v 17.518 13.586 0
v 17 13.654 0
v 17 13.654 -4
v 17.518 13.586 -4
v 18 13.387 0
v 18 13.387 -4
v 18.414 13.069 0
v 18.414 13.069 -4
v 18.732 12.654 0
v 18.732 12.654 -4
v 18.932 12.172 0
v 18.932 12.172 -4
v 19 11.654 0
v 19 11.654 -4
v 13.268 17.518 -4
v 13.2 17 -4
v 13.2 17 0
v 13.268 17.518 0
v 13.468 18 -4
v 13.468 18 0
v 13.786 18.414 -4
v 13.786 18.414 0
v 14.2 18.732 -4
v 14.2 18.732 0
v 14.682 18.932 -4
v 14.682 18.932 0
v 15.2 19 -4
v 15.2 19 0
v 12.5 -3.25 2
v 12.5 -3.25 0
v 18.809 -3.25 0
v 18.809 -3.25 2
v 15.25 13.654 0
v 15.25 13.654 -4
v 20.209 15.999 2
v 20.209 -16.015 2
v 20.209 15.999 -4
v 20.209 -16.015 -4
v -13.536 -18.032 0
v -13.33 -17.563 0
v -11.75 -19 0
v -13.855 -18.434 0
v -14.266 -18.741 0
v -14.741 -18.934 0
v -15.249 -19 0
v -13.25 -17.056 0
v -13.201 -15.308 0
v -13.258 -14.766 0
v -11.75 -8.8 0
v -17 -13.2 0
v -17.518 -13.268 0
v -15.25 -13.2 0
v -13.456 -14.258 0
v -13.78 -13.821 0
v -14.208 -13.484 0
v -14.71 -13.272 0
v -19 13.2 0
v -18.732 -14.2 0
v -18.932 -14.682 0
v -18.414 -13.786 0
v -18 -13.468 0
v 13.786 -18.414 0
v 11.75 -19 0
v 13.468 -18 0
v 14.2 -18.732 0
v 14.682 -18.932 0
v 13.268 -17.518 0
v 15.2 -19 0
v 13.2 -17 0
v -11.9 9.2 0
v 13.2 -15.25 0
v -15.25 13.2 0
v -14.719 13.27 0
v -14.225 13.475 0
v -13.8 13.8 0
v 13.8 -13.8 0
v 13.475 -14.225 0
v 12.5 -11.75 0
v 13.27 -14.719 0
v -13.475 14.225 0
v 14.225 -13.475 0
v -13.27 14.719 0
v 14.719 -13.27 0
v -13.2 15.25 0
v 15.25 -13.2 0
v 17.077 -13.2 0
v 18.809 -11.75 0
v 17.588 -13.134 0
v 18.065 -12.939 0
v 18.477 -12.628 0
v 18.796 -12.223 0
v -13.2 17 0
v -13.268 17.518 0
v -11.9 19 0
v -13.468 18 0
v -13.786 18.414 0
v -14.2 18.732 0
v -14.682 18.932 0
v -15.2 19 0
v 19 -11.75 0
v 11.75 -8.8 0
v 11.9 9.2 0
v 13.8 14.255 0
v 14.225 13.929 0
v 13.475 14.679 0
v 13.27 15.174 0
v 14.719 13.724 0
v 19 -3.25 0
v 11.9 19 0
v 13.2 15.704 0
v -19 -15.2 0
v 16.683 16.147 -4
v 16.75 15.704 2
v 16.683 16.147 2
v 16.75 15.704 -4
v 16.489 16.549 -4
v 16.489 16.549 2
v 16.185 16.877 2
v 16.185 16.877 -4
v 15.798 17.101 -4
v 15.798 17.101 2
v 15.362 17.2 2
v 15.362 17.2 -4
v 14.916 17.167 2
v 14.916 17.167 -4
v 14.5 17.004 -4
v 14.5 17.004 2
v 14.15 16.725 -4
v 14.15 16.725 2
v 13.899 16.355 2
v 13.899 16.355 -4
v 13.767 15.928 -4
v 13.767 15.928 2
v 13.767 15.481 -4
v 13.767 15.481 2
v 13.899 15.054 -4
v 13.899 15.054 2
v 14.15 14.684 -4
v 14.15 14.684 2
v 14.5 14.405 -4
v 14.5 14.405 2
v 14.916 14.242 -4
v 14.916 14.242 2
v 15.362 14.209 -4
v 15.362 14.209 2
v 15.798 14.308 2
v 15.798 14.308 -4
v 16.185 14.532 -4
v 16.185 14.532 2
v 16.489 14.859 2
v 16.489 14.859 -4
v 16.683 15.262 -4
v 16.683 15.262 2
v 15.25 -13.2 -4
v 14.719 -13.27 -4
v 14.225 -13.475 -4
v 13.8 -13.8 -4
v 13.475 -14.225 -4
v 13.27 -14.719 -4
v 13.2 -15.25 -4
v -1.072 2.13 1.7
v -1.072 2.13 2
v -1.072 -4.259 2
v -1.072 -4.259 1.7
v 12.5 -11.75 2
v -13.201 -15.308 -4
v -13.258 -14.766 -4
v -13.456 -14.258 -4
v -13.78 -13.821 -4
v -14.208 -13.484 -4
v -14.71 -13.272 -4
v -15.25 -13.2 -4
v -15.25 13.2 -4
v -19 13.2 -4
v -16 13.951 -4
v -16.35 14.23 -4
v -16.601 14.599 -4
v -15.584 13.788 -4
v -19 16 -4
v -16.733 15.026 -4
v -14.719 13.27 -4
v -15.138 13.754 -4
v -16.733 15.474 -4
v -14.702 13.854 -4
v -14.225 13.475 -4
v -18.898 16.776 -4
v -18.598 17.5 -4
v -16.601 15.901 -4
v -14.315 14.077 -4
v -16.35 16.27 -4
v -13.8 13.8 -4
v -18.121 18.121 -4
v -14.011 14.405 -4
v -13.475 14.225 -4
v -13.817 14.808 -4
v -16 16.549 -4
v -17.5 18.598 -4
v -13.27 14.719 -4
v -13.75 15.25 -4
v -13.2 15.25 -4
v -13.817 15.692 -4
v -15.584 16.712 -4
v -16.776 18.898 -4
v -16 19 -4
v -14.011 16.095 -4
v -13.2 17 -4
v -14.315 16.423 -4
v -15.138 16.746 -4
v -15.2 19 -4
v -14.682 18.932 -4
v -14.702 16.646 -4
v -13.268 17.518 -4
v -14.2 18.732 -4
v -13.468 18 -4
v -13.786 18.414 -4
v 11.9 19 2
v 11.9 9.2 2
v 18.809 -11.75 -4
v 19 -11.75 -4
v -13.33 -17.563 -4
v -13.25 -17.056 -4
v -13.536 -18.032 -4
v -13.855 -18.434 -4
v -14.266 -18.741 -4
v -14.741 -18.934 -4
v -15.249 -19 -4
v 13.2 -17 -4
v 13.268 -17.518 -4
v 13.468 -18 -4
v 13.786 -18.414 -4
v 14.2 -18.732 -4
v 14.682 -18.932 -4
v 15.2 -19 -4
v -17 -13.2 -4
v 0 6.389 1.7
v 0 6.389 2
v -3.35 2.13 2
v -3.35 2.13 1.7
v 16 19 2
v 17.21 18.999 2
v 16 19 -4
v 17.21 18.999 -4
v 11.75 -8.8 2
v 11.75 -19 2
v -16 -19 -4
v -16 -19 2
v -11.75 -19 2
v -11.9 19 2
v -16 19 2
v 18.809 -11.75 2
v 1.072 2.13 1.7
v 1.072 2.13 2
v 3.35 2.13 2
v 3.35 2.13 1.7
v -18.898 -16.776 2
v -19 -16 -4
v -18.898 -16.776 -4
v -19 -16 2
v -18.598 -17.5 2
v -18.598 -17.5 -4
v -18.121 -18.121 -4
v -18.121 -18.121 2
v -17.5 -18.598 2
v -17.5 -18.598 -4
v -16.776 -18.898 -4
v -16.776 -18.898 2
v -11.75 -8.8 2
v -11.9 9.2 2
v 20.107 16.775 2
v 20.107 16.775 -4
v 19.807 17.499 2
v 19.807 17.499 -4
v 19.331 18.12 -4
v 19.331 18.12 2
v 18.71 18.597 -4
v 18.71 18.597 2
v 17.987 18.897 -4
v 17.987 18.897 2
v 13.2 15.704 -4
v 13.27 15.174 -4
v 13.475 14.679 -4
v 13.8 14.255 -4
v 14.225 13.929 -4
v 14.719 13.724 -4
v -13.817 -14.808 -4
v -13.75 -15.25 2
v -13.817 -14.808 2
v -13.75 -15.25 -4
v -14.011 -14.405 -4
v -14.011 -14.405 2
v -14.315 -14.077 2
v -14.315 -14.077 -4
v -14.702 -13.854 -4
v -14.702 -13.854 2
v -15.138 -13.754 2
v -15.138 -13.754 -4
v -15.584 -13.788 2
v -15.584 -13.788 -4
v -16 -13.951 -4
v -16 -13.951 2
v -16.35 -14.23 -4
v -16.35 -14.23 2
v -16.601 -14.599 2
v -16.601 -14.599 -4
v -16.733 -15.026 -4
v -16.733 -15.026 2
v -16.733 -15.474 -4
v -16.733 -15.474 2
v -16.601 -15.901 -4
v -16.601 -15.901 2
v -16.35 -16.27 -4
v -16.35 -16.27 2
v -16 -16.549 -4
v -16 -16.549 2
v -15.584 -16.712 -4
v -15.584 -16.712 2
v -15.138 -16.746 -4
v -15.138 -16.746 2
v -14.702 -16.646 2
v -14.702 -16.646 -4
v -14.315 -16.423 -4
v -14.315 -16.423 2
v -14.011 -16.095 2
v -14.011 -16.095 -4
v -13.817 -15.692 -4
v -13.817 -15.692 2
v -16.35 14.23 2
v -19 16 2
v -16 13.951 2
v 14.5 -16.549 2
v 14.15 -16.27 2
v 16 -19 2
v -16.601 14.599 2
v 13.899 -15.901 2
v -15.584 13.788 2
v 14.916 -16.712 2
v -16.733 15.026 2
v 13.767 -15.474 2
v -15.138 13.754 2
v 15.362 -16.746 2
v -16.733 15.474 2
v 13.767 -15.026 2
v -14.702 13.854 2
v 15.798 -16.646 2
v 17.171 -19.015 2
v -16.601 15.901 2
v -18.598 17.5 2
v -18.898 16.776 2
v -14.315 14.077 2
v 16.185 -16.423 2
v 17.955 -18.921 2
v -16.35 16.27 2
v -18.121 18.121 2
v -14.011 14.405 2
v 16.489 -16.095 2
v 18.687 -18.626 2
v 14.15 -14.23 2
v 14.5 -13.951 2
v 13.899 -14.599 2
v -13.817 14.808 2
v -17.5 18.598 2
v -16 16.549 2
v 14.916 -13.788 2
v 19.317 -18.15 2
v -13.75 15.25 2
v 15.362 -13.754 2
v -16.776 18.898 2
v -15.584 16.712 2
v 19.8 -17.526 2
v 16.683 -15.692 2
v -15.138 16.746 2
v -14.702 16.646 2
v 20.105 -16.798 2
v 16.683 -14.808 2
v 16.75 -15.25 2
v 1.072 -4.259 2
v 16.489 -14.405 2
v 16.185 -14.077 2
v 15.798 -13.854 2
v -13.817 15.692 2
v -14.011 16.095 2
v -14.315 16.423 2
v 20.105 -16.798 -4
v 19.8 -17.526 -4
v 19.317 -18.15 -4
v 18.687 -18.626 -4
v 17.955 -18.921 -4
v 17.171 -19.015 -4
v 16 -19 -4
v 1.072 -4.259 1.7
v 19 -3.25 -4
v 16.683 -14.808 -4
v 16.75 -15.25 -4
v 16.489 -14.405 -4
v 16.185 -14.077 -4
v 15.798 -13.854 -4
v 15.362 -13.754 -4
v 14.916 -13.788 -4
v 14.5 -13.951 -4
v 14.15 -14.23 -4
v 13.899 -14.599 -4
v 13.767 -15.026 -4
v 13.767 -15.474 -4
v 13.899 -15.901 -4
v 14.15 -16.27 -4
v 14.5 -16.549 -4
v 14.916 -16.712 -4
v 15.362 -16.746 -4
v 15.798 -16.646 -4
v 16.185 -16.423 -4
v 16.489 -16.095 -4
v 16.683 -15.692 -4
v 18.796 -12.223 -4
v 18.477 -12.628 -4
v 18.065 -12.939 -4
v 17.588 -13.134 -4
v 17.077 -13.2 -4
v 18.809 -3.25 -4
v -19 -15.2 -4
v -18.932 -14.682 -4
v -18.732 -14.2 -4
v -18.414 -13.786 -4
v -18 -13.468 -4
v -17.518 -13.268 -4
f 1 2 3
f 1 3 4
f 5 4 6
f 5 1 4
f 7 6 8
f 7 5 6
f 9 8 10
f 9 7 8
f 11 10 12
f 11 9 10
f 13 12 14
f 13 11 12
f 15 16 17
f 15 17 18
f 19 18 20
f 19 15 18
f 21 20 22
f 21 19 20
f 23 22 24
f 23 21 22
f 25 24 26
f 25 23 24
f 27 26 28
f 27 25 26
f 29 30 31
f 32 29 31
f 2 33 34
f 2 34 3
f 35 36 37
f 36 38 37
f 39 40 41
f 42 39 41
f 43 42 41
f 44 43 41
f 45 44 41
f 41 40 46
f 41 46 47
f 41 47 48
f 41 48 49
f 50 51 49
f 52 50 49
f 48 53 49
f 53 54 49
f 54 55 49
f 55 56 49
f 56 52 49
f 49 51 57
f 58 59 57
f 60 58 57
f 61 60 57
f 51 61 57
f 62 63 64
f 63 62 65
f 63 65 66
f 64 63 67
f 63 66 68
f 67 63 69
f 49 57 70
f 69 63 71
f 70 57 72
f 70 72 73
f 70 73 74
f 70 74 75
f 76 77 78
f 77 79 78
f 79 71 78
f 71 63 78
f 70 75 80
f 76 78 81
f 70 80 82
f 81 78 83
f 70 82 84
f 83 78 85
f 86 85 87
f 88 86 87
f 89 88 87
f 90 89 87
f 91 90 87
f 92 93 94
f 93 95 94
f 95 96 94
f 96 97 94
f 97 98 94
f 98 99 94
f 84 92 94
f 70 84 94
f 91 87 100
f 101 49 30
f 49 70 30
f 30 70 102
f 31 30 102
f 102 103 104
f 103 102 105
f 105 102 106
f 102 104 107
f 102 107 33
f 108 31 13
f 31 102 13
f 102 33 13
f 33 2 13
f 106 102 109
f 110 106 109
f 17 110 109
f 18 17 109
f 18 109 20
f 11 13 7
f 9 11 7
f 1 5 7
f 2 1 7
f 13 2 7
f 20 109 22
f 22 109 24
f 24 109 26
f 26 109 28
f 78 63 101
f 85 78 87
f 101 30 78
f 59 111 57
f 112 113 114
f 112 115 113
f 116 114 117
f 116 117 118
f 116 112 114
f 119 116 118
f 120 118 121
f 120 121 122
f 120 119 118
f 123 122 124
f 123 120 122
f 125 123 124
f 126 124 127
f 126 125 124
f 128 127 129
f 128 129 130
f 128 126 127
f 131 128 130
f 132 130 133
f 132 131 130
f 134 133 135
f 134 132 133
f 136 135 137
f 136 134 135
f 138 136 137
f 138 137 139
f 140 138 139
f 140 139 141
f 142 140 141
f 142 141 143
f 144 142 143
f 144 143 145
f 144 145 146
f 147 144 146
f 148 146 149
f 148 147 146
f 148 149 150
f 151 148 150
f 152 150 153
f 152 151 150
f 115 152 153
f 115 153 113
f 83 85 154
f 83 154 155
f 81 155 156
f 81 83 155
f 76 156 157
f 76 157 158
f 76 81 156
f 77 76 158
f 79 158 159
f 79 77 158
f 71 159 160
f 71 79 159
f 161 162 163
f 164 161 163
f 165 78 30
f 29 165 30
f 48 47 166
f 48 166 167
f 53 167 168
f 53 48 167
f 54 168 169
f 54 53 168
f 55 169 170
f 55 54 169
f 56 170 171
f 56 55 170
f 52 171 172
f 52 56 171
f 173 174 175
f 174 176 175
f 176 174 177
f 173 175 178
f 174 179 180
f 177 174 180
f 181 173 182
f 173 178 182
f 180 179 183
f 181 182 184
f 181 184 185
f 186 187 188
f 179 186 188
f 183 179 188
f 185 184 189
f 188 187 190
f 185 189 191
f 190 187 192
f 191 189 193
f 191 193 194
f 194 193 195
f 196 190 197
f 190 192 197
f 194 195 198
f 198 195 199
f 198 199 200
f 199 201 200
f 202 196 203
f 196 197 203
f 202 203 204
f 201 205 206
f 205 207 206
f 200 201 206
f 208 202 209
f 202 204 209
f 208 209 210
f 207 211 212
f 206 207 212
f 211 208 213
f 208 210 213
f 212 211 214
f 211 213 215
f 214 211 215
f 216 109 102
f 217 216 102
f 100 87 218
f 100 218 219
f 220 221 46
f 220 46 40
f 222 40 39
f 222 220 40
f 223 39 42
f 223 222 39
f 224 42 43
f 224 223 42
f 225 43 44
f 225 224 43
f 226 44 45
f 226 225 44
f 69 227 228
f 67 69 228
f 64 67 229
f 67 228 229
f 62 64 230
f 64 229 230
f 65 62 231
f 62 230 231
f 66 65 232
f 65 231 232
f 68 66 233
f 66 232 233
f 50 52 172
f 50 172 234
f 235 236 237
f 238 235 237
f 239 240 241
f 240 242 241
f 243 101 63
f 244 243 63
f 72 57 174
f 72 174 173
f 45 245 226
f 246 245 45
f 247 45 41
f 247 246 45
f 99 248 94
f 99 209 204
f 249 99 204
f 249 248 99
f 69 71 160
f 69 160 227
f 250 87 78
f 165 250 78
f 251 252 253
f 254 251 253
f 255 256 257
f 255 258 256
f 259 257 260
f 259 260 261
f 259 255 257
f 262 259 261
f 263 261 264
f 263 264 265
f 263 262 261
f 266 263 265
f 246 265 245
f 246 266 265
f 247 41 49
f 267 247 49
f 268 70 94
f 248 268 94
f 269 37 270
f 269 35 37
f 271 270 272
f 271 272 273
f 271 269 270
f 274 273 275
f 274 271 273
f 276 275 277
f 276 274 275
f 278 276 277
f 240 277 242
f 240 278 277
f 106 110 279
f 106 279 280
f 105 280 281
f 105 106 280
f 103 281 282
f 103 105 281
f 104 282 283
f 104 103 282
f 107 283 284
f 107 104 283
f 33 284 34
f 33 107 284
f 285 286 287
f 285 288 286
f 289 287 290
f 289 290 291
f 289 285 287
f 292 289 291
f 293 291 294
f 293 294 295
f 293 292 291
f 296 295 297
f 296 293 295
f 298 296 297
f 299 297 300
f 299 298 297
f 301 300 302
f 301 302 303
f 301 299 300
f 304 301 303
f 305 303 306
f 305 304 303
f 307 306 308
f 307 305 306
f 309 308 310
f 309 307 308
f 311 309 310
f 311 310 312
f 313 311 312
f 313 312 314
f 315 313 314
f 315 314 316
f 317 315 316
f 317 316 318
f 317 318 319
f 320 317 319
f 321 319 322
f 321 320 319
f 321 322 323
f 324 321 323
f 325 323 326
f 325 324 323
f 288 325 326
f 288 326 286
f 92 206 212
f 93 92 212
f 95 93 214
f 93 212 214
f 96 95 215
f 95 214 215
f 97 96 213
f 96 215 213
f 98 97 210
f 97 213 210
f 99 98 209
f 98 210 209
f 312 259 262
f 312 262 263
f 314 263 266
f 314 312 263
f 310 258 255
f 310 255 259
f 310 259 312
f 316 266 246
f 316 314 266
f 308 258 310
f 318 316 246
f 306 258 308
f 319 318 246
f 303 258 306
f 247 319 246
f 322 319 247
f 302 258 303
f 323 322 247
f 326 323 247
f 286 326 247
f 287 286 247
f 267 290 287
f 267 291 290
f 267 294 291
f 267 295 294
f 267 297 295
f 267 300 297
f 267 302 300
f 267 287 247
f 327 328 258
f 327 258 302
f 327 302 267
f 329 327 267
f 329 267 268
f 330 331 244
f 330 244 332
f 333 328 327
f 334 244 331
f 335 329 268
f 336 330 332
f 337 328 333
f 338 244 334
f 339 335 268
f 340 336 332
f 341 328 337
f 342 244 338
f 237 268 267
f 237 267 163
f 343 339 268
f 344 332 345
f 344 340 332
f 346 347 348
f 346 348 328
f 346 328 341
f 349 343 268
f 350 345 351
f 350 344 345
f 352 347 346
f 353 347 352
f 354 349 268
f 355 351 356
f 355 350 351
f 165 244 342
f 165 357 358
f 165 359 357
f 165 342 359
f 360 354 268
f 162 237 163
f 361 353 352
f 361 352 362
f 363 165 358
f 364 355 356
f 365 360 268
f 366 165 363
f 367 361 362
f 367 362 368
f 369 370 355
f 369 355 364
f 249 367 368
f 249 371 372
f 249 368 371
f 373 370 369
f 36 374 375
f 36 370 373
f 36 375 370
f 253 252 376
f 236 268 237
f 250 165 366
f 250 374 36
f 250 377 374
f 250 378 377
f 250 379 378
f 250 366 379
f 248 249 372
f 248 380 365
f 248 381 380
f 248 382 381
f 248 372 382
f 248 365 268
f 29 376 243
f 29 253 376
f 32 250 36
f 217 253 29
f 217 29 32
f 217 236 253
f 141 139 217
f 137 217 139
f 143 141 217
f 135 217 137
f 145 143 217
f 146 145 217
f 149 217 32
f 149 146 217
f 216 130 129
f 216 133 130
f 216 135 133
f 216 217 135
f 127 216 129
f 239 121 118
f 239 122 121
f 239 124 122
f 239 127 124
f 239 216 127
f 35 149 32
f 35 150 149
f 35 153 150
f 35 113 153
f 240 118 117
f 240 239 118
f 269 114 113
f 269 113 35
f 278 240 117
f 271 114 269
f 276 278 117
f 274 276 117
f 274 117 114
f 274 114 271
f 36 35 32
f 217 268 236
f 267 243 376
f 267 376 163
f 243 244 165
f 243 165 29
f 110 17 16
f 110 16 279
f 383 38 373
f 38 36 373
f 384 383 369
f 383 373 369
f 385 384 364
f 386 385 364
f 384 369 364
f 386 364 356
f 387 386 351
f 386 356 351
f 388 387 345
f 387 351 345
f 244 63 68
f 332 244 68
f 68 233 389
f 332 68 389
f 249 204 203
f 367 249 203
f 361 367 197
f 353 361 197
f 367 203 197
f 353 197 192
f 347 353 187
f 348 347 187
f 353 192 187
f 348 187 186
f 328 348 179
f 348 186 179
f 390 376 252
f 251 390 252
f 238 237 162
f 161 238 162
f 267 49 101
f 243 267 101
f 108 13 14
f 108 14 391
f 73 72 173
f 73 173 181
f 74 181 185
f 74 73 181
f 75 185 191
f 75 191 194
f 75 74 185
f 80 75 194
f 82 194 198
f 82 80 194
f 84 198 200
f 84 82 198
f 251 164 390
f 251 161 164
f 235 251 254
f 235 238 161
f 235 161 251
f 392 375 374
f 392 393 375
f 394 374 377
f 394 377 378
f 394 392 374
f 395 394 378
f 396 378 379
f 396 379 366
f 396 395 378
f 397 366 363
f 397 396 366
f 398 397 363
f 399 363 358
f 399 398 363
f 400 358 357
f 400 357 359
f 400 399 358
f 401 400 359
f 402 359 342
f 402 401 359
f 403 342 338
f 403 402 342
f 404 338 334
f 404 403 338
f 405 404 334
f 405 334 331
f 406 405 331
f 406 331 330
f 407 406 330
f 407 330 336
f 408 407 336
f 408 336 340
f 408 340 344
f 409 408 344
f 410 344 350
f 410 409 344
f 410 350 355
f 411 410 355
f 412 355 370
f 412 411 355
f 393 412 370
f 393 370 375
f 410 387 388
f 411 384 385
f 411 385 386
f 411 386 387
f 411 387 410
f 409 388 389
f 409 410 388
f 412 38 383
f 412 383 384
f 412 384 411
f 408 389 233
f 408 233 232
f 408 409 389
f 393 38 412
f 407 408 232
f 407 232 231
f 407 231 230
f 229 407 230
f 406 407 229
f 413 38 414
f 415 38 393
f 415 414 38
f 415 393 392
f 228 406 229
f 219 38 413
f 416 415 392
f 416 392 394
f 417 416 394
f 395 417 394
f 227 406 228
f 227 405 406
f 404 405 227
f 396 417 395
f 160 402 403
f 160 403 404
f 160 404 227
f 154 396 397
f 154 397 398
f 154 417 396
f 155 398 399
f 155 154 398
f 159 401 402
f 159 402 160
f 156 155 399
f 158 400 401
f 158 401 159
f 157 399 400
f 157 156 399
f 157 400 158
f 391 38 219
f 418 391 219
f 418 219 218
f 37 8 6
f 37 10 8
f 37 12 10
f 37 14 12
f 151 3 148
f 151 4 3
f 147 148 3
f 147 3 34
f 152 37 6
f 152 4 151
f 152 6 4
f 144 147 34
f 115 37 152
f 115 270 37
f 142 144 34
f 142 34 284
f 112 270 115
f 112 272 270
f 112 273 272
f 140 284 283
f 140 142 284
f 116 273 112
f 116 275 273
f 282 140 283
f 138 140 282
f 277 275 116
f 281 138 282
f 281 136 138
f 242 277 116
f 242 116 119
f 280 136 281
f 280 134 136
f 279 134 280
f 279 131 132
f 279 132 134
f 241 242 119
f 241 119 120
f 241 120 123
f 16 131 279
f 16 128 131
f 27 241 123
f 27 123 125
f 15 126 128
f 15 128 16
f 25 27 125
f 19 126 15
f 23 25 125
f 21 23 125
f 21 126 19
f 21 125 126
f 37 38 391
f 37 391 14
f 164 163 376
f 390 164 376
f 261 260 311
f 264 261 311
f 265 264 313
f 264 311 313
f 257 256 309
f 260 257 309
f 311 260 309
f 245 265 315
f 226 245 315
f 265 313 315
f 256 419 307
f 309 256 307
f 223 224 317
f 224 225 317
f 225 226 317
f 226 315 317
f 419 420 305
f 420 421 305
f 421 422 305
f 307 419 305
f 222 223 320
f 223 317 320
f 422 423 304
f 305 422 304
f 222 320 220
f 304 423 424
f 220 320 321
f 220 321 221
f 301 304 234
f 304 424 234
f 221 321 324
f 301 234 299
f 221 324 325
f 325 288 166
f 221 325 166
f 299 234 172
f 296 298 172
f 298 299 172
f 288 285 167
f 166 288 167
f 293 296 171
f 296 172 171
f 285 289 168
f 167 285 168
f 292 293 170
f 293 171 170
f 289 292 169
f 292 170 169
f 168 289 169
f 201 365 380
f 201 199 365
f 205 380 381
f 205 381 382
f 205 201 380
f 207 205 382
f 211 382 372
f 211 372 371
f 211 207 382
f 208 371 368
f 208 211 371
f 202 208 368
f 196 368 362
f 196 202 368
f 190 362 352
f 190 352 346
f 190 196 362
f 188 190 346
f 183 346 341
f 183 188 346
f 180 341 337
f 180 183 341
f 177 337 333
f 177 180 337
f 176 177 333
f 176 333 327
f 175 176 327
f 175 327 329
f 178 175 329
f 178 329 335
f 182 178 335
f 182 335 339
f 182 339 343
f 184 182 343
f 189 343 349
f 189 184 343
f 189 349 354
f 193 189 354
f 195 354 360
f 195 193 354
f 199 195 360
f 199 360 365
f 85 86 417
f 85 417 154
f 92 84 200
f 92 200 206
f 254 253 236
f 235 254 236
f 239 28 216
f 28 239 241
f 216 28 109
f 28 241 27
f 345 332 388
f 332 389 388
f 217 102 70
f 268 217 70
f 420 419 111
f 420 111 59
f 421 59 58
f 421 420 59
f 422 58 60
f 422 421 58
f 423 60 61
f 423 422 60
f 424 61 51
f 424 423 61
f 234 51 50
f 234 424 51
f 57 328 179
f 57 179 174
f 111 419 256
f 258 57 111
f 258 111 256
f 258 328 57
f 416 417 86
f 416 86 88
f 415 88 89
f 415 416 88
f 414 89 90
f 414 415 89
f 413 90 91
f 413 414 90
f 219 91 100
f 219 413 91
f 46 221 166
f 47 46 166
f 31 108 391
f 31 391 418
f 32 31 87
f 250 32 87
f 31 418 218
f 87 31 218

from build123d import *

# Parameters (mm, degrees)
F0_R         = 1.5
F1_DEPTH     = 2
F2_DEPTH     = 4
F3_T1_DEPTH  = 9
F4_T4_DEPTH  = 9
F4_T6_DEPTH  = 4
F4_T8_DEPTH  = 9
F4_T10_DEPTH = 8.8612846748
F4_T12_DEPTH = 9
F4_T14_DEPTH = 9
F5_R         = 3
F6_R         = 3
F8_DEPTH     = 0.3


# Not quite as in the source:
# - a fillet or chamfer that OpenCascade refuses, or shapes differently, is made with other operations: its cross-section is extruded or revolved along the edge and cut away or added


with BuildPart() as f1:
    # F0 (on Top) → F1 (new body)
    with BuildSketch(Plane.XY):
        with BuildLine():
            Line((11.75, -19), (13.2, -19))
            Line((13.2, -19), (13.2, -15.25))
            ThreePointArc((13.2, -15.25), (13.8004310986, -13.8004310986), (15.25, -13.2))
            Line((15.25, -13.2), (19, -13.2))
            Line((19, -13.2), (19, -11.75))
            Line((19, -11.75), (18.8090763986, -11.75))
            Line((18.8090763986, -11.75), (12.5, -11.75))
            Line((12.5, -11.75), (12.5, -3.25))
            Line((12.5, -3.25), (18.8090763986, -3.25))
            Line((18.8090763986, -3.25), (19, -3.25))
            Line((19, -3.25), (19, 13.6544716179))
            Line((19, 13.6544716179), (15.25, 13.6544716179))
            ThreePointArc((15.25, 13.6544716179), (13.8004310986, 14.2549027165), (13.2, 15.7044716179))
            Line((13.2, 15.7044716179), (13.2, 19))
            Line((13.2, 19), (11.9, 19))
            Line((11.9, 19), (11.9, 9.2))
            Line((11.9, 9.2), (0, 9.2))
            Line((0, 9.2), (-11.9, 9.2))
            Line((-11.9, 9.2), (-11.9, 19))
            Line((-11.9, 19), (-13.2, 19))
            Line((-13.2, 19), (-13.2, 15.25))
            ThreePointArc((-13.2, 15.25), (-13.8004310986, 13.8004310986), (-15.25, 13.2))
            Line((-15.25, 13.2), (-19, 13.2))
            Line((-19, 13.2), (-19, -13.2))
            Line((-19, -13.2), (-15.25, -13.2))
            ThreePointArc((-15.25, -13.2), (-13.7801859172, -13.8209630649), (-13.2008111101, -15.3076618908))
            Line((-13.2008111101, -15.3076618908), (-13.304709388, -19))
            Line((-13.304709388, -19), (-11.75, -19))
            Line((-11.75, -19), (-11.75, -8.8))
            Line((-11.75, -8.8), (11.75, -8.8))
            Line((11.75, -8.8), (11.75, -19))
        make_face()
        with BuildLine():
            Line((-19, 16), (-19, 13.2))
            Line((-19, 13.2), (-15.25, 13.2))
            ThreePointArc((-15.25, 13.2), (-13.8004310986, 13.8004310986), (-13.2, 15.25))
            Line((-13.2, 15.25), (-13.2, 19))
            Line((-13.2, 19), (-16, 19))
            ThreePointArc((-16, 19), (-18.1213203436, 18.1213203436), (-19, 16))
        make_face()
        with Locations((-15.25, 15.25)):
            Circle(F0_R, mode=Mode.SUBTRACT)
        with BuildLine():
            Line((13.2, -19), (16, -19))
            Line((16, -19), (20.2087182552, -19.0532333363))
            Line((20.2087182552, -19.0532333363), (20.2087182552, 18.9976152033))
            Line((20.2087182552, 18.9976152033), (16, 19))
            Line((16, 19), (13.2, 19))
            Line((13.2, 19), (13.2, 15.7044716179))
            ThreePointArc((13.2, 15.7044716179), (13.8004310986, 14.2549027165), (15.25, 13.6544716179))
            Line((15.25, 13.6544716179), (19, 13.6544716179))
            Line((19, 13.6544716179), (19, -3.25))
            Line((19, -3.25), (18.8090763986, -3.25))
            Line((18.8090763986, -3.25), (18.8090763986, -11.75))
            Line((18.8090763986, -11.75), (19, -11.75))
            Line((19, -11.75), (19, -13.2))
            Line((19, -13.2), (15.25, -13.2))
            ThreePointArc((15.25, -13.2), (13.8004310986, -13.8004310986), (13.2, -15.25))
            Line((13.2, -15.25), (13.2, -19))
        make_face()
        with Locations((15.25, -15.25)):
            Circle(F0_R, mode=Mode.SUBTRACT)
        with Locations((15.25, 15.7044716179)):
            Circle(F0_R, mode=Mode.SUBTRACT)
        with BuildLine():
            Line((-16, -19), (-13.304709388, -19))
            Line((-13.304709388, -19), (-13.2008111101, -15.3076618908))
            ThreePointArc((-13.2008111101, -15.3076618908), (-13.7801859172, -13.8209630649), (-15.25, -13.2))
            Line((-15.25, -13.2), (-19, -13.2))
            Line((-19, -13.2), (-19, -16))
            ThreePointArc((-19, -16), (-18.1213203436, -18.1213203436), (-16, -19))
        make_face()
        with Locations((-15.25, -15.25)):
            Circle(F0_R, mode=Mode.SUBTRACT)
    extrude(amount=F1_DEPTH)

    # F0 (on Top) → F2 (join)
    with BuildSketch(Plane.XY):
        with BuildLine():
            Line((-16, -19), (-13.304709388, -19))
            Line((-13.304709388, -19), (-13.2008111101, -15.3076618908))
            ThreePointArc((-13.2008111101, -15.3076618908), (-13.7801859172, -13.8209630649), (-15.25, -13.2))
            Line((-15.25, -13.2), (-19, -13.2))
            Line((-19, -13.2), (-19, -16))
            ThreePointArc((-19, -16), (-18.1213203436, -18.1213203436), (-16, -19))
        make_face()
        with Locations((-15.25, -15.25)):
            Circle(F0_R, mode=Mode.SUBTRACT)
        with BuildLine():
            Line((13.2, -19), (16, -19))
            Line((16, -19), (20.2087182552, -19.0532333363))
            Line((20.2087182552, -19.0532333363), (20.2087182552, 18.9976152033))
            Line((20.2087182552, 18.9976152033), (16, 19))
            Line((16, 19), (13.2, 19))
            Line((13.2, 19), (13.2, 15.7044716179))
            ThreePointArc((13.2, 15.7044716179), (13.8004310986, 14.2549027165), (15.25, 13.6544716179))
            Line((15.25, 13.6544716179), (19, 13.6544716179))
            Line((19, 13.6544716179), (19, -3.25))
            Line((19, -3.25), (18.8090763986, -3.25))
            Line((18.8090763986, -3.25), (18.8090763986, -11.75))
            Line((18.8090763986, -11.75), (19, -11.75))
            Line((19, -11.75), (19, -13.2))
            Line((19, -13.2), (15.25, -13.2))
            ThreePointArc((15.25, -13.2), (13.8004310986, -13.8004310986), (13.2, -15.25))
            Line((13.2, -15.25), (13.2, -19))
        make_face()
        with Locations((15.25, -15.25)):
            Circle(F0_R, mode=Mode.SUBTRACT)
        with Locations((15.25, 15.7044716179)):
            Circle(F0_R, mode=Mode.SUBTRACT)
        with BuildLine():
            Line((-19, 16), (-19, 13.2))
            Line((-19, 13.2), (-15.25, 13.2))
            ThreePointArc((-15.25, 13.2), (-13.8004310986, 13.8004310986), (-13.2, 15.25))
            Line((-13.2, 15.25), (-13.2, 19))
            Line((-13.2, 19), (-16, 19))
            ThreePointArc((-16, 19), (-18.1213203436, 18.1213203436), (-19, 16))
        make_face()
        with Locations((-15.25, 15.25)):
            Circle(F0_R, mode=Mode.SUBTRACT)
    extrude(amount=-F2_DEPTH)

    # F3: fillet of radius 2 on 1 edges, made by hand

    # F3_s2 → F3_t1 (cut)
    with BuildSketch(Plane.XY.offset(-9)):
        with BuildLine():
            ThreePointArc((-13.2, 17), (-13.7857864376, 18.4142135624), (-15.2, 19))
            Line((-15.2, 19), (-13.2, 19))
            Line((-13.2, 19), (-13.2, 17))
        make_face()
    extrude(amount=F3_T1_DEPTH, mode=Mode.SUBTRACT)

    # F4: fillet of radius 2 on 6 edges, made by hand


with BuildPart() as f4_tool2:
    # F4_s3 → F4_t4 (new body)
    with BuildSketch(Plane.XY.offset(5)):
        with BuildLine():
            ThreePointArc((17, 13.6544716179), (18.4142135624, 13.0686851803), (19, 11.6544716179))
            Line((19, 11.6544716179), (19, 13.6544716179))
            Line((19, 13.6544716179), (17, 13.6544716179))
        make_face()
    extrude(amount=-F4_T4_DEPTH)

    split(bisect_by=Plane.XY.offset(2), keep=Keep.BOTTOM)


with BuildPart() as f1_1:
    add(f1.part)

    # F4_t1: union F4_tool2
    add(f4_tool2.part)

    # F4_s7 → F4_t6 (join)
    with BuildSketch(Plane.XY.offset(-4)):
        with BuildLine():
            ThreePointArc((17.0771115477, -13.2), (18.2812710056, -12.7968719423), (19, -11.75))
            Line((19, -11.75), (19, -13.2))
            Line((19, -13.2), (17.0771115477, -13.2))
        make_face()
    extrude(amount=F4_T6_DEPTH)

    # F4_s9 → F4_t8 (cut)
    with BuildSketch(Plane.XY.offset(-9)):
        with BuildLine():
            ThreePointArc((-19, -15.2), (-18.4142135624, -13.7857864376), (-17, -13.2))
            Line((-17, -13.2), (-19, -13.2))
            Line((-19, -13.2), (-19, -15.2))
        make_face()
    extrude(amount=F4_T8_DEPTH, mode=Mode.SUBTRACT)

    # F4_s11 → F4_t10 (cut)
    with BuildSketch(Plane.XY.offset(-8.8612846748)):
        with BuildLine():
            ThreePointArc((-13.2500145849, -17.0562555032), (-13.8550408822, -18.4339649588), (-15.249223258, -19))
            Line((-15.249223258, -19), (-13.304709388, -19))
            Line((-13.304709388, -19), (-13.2500145849, -17.0562555032))
        make_face()
    extrude(amount=F4_T10_DEPTH, mode=Mode.SUBTRACT)

    # F4_s13 → F4_t12 (cut)
    with BuildSketch(Plane.XY.offset(-9)):
        with BuildLine():
            ThreePointArc((13.2, 17), (13.7857864376, 18.4142135624), (15.2, 19))
            Line((15.2, 19), (13.2, 19))
            Line((13.2, 19), (13.2, 17))
        make_face()
    extrude(amount=F4_T12_DEPTH, mode=Mode.SUBTRACT)

    # F4_s15 → F4_t14 (cut)
    with BuildSketch(Plane.XY.offset(-9)):
        with BuildLine():
            ThreePointArc((13.2, -17), (13.7857864376, -18.4142135624), (15.2, -19))
            Line((15.2, -19), (13.2, -19))
            Line((13.2, -19), (13.2, -17))
        make_face()
    extrude(amount=F4_T14_DEPTH, mode=Mode.SUBTRACT)

    # F5
    f5_edges = [f1_1.edges().sort_by_distance(p)[0] for p in [
        (20.208718, -19.053233, -1),
    ]]
    fillet(f5_edges, radius=F5_R)

    # F6
    f6_edges = [f1_1.edges().sort_by_distance(p)[0] for p in [
        (20.208718, 18.997615, -1),
    ]]
    fillet(f6_edges, radius=F6_R)

    # F7 (on face) → F8 (cut)
    with BuildSketch(Plane.XY.offset(2)):
        Polygon((-1.0717540281, -4.259434063), (1.0717540281, -4.259434063), (1.0717540281, 2.1297170315), (3.3500560094, 2.1297170315), (0, 6.3891510945), (-3.3500560094, 2.1297170315), (-1.0717540281, 2.1297170315), align=None)
    extrude(amount=-F8_DEPTH, mode=Mode.SUBTRACT)


solid = f1_1.part
